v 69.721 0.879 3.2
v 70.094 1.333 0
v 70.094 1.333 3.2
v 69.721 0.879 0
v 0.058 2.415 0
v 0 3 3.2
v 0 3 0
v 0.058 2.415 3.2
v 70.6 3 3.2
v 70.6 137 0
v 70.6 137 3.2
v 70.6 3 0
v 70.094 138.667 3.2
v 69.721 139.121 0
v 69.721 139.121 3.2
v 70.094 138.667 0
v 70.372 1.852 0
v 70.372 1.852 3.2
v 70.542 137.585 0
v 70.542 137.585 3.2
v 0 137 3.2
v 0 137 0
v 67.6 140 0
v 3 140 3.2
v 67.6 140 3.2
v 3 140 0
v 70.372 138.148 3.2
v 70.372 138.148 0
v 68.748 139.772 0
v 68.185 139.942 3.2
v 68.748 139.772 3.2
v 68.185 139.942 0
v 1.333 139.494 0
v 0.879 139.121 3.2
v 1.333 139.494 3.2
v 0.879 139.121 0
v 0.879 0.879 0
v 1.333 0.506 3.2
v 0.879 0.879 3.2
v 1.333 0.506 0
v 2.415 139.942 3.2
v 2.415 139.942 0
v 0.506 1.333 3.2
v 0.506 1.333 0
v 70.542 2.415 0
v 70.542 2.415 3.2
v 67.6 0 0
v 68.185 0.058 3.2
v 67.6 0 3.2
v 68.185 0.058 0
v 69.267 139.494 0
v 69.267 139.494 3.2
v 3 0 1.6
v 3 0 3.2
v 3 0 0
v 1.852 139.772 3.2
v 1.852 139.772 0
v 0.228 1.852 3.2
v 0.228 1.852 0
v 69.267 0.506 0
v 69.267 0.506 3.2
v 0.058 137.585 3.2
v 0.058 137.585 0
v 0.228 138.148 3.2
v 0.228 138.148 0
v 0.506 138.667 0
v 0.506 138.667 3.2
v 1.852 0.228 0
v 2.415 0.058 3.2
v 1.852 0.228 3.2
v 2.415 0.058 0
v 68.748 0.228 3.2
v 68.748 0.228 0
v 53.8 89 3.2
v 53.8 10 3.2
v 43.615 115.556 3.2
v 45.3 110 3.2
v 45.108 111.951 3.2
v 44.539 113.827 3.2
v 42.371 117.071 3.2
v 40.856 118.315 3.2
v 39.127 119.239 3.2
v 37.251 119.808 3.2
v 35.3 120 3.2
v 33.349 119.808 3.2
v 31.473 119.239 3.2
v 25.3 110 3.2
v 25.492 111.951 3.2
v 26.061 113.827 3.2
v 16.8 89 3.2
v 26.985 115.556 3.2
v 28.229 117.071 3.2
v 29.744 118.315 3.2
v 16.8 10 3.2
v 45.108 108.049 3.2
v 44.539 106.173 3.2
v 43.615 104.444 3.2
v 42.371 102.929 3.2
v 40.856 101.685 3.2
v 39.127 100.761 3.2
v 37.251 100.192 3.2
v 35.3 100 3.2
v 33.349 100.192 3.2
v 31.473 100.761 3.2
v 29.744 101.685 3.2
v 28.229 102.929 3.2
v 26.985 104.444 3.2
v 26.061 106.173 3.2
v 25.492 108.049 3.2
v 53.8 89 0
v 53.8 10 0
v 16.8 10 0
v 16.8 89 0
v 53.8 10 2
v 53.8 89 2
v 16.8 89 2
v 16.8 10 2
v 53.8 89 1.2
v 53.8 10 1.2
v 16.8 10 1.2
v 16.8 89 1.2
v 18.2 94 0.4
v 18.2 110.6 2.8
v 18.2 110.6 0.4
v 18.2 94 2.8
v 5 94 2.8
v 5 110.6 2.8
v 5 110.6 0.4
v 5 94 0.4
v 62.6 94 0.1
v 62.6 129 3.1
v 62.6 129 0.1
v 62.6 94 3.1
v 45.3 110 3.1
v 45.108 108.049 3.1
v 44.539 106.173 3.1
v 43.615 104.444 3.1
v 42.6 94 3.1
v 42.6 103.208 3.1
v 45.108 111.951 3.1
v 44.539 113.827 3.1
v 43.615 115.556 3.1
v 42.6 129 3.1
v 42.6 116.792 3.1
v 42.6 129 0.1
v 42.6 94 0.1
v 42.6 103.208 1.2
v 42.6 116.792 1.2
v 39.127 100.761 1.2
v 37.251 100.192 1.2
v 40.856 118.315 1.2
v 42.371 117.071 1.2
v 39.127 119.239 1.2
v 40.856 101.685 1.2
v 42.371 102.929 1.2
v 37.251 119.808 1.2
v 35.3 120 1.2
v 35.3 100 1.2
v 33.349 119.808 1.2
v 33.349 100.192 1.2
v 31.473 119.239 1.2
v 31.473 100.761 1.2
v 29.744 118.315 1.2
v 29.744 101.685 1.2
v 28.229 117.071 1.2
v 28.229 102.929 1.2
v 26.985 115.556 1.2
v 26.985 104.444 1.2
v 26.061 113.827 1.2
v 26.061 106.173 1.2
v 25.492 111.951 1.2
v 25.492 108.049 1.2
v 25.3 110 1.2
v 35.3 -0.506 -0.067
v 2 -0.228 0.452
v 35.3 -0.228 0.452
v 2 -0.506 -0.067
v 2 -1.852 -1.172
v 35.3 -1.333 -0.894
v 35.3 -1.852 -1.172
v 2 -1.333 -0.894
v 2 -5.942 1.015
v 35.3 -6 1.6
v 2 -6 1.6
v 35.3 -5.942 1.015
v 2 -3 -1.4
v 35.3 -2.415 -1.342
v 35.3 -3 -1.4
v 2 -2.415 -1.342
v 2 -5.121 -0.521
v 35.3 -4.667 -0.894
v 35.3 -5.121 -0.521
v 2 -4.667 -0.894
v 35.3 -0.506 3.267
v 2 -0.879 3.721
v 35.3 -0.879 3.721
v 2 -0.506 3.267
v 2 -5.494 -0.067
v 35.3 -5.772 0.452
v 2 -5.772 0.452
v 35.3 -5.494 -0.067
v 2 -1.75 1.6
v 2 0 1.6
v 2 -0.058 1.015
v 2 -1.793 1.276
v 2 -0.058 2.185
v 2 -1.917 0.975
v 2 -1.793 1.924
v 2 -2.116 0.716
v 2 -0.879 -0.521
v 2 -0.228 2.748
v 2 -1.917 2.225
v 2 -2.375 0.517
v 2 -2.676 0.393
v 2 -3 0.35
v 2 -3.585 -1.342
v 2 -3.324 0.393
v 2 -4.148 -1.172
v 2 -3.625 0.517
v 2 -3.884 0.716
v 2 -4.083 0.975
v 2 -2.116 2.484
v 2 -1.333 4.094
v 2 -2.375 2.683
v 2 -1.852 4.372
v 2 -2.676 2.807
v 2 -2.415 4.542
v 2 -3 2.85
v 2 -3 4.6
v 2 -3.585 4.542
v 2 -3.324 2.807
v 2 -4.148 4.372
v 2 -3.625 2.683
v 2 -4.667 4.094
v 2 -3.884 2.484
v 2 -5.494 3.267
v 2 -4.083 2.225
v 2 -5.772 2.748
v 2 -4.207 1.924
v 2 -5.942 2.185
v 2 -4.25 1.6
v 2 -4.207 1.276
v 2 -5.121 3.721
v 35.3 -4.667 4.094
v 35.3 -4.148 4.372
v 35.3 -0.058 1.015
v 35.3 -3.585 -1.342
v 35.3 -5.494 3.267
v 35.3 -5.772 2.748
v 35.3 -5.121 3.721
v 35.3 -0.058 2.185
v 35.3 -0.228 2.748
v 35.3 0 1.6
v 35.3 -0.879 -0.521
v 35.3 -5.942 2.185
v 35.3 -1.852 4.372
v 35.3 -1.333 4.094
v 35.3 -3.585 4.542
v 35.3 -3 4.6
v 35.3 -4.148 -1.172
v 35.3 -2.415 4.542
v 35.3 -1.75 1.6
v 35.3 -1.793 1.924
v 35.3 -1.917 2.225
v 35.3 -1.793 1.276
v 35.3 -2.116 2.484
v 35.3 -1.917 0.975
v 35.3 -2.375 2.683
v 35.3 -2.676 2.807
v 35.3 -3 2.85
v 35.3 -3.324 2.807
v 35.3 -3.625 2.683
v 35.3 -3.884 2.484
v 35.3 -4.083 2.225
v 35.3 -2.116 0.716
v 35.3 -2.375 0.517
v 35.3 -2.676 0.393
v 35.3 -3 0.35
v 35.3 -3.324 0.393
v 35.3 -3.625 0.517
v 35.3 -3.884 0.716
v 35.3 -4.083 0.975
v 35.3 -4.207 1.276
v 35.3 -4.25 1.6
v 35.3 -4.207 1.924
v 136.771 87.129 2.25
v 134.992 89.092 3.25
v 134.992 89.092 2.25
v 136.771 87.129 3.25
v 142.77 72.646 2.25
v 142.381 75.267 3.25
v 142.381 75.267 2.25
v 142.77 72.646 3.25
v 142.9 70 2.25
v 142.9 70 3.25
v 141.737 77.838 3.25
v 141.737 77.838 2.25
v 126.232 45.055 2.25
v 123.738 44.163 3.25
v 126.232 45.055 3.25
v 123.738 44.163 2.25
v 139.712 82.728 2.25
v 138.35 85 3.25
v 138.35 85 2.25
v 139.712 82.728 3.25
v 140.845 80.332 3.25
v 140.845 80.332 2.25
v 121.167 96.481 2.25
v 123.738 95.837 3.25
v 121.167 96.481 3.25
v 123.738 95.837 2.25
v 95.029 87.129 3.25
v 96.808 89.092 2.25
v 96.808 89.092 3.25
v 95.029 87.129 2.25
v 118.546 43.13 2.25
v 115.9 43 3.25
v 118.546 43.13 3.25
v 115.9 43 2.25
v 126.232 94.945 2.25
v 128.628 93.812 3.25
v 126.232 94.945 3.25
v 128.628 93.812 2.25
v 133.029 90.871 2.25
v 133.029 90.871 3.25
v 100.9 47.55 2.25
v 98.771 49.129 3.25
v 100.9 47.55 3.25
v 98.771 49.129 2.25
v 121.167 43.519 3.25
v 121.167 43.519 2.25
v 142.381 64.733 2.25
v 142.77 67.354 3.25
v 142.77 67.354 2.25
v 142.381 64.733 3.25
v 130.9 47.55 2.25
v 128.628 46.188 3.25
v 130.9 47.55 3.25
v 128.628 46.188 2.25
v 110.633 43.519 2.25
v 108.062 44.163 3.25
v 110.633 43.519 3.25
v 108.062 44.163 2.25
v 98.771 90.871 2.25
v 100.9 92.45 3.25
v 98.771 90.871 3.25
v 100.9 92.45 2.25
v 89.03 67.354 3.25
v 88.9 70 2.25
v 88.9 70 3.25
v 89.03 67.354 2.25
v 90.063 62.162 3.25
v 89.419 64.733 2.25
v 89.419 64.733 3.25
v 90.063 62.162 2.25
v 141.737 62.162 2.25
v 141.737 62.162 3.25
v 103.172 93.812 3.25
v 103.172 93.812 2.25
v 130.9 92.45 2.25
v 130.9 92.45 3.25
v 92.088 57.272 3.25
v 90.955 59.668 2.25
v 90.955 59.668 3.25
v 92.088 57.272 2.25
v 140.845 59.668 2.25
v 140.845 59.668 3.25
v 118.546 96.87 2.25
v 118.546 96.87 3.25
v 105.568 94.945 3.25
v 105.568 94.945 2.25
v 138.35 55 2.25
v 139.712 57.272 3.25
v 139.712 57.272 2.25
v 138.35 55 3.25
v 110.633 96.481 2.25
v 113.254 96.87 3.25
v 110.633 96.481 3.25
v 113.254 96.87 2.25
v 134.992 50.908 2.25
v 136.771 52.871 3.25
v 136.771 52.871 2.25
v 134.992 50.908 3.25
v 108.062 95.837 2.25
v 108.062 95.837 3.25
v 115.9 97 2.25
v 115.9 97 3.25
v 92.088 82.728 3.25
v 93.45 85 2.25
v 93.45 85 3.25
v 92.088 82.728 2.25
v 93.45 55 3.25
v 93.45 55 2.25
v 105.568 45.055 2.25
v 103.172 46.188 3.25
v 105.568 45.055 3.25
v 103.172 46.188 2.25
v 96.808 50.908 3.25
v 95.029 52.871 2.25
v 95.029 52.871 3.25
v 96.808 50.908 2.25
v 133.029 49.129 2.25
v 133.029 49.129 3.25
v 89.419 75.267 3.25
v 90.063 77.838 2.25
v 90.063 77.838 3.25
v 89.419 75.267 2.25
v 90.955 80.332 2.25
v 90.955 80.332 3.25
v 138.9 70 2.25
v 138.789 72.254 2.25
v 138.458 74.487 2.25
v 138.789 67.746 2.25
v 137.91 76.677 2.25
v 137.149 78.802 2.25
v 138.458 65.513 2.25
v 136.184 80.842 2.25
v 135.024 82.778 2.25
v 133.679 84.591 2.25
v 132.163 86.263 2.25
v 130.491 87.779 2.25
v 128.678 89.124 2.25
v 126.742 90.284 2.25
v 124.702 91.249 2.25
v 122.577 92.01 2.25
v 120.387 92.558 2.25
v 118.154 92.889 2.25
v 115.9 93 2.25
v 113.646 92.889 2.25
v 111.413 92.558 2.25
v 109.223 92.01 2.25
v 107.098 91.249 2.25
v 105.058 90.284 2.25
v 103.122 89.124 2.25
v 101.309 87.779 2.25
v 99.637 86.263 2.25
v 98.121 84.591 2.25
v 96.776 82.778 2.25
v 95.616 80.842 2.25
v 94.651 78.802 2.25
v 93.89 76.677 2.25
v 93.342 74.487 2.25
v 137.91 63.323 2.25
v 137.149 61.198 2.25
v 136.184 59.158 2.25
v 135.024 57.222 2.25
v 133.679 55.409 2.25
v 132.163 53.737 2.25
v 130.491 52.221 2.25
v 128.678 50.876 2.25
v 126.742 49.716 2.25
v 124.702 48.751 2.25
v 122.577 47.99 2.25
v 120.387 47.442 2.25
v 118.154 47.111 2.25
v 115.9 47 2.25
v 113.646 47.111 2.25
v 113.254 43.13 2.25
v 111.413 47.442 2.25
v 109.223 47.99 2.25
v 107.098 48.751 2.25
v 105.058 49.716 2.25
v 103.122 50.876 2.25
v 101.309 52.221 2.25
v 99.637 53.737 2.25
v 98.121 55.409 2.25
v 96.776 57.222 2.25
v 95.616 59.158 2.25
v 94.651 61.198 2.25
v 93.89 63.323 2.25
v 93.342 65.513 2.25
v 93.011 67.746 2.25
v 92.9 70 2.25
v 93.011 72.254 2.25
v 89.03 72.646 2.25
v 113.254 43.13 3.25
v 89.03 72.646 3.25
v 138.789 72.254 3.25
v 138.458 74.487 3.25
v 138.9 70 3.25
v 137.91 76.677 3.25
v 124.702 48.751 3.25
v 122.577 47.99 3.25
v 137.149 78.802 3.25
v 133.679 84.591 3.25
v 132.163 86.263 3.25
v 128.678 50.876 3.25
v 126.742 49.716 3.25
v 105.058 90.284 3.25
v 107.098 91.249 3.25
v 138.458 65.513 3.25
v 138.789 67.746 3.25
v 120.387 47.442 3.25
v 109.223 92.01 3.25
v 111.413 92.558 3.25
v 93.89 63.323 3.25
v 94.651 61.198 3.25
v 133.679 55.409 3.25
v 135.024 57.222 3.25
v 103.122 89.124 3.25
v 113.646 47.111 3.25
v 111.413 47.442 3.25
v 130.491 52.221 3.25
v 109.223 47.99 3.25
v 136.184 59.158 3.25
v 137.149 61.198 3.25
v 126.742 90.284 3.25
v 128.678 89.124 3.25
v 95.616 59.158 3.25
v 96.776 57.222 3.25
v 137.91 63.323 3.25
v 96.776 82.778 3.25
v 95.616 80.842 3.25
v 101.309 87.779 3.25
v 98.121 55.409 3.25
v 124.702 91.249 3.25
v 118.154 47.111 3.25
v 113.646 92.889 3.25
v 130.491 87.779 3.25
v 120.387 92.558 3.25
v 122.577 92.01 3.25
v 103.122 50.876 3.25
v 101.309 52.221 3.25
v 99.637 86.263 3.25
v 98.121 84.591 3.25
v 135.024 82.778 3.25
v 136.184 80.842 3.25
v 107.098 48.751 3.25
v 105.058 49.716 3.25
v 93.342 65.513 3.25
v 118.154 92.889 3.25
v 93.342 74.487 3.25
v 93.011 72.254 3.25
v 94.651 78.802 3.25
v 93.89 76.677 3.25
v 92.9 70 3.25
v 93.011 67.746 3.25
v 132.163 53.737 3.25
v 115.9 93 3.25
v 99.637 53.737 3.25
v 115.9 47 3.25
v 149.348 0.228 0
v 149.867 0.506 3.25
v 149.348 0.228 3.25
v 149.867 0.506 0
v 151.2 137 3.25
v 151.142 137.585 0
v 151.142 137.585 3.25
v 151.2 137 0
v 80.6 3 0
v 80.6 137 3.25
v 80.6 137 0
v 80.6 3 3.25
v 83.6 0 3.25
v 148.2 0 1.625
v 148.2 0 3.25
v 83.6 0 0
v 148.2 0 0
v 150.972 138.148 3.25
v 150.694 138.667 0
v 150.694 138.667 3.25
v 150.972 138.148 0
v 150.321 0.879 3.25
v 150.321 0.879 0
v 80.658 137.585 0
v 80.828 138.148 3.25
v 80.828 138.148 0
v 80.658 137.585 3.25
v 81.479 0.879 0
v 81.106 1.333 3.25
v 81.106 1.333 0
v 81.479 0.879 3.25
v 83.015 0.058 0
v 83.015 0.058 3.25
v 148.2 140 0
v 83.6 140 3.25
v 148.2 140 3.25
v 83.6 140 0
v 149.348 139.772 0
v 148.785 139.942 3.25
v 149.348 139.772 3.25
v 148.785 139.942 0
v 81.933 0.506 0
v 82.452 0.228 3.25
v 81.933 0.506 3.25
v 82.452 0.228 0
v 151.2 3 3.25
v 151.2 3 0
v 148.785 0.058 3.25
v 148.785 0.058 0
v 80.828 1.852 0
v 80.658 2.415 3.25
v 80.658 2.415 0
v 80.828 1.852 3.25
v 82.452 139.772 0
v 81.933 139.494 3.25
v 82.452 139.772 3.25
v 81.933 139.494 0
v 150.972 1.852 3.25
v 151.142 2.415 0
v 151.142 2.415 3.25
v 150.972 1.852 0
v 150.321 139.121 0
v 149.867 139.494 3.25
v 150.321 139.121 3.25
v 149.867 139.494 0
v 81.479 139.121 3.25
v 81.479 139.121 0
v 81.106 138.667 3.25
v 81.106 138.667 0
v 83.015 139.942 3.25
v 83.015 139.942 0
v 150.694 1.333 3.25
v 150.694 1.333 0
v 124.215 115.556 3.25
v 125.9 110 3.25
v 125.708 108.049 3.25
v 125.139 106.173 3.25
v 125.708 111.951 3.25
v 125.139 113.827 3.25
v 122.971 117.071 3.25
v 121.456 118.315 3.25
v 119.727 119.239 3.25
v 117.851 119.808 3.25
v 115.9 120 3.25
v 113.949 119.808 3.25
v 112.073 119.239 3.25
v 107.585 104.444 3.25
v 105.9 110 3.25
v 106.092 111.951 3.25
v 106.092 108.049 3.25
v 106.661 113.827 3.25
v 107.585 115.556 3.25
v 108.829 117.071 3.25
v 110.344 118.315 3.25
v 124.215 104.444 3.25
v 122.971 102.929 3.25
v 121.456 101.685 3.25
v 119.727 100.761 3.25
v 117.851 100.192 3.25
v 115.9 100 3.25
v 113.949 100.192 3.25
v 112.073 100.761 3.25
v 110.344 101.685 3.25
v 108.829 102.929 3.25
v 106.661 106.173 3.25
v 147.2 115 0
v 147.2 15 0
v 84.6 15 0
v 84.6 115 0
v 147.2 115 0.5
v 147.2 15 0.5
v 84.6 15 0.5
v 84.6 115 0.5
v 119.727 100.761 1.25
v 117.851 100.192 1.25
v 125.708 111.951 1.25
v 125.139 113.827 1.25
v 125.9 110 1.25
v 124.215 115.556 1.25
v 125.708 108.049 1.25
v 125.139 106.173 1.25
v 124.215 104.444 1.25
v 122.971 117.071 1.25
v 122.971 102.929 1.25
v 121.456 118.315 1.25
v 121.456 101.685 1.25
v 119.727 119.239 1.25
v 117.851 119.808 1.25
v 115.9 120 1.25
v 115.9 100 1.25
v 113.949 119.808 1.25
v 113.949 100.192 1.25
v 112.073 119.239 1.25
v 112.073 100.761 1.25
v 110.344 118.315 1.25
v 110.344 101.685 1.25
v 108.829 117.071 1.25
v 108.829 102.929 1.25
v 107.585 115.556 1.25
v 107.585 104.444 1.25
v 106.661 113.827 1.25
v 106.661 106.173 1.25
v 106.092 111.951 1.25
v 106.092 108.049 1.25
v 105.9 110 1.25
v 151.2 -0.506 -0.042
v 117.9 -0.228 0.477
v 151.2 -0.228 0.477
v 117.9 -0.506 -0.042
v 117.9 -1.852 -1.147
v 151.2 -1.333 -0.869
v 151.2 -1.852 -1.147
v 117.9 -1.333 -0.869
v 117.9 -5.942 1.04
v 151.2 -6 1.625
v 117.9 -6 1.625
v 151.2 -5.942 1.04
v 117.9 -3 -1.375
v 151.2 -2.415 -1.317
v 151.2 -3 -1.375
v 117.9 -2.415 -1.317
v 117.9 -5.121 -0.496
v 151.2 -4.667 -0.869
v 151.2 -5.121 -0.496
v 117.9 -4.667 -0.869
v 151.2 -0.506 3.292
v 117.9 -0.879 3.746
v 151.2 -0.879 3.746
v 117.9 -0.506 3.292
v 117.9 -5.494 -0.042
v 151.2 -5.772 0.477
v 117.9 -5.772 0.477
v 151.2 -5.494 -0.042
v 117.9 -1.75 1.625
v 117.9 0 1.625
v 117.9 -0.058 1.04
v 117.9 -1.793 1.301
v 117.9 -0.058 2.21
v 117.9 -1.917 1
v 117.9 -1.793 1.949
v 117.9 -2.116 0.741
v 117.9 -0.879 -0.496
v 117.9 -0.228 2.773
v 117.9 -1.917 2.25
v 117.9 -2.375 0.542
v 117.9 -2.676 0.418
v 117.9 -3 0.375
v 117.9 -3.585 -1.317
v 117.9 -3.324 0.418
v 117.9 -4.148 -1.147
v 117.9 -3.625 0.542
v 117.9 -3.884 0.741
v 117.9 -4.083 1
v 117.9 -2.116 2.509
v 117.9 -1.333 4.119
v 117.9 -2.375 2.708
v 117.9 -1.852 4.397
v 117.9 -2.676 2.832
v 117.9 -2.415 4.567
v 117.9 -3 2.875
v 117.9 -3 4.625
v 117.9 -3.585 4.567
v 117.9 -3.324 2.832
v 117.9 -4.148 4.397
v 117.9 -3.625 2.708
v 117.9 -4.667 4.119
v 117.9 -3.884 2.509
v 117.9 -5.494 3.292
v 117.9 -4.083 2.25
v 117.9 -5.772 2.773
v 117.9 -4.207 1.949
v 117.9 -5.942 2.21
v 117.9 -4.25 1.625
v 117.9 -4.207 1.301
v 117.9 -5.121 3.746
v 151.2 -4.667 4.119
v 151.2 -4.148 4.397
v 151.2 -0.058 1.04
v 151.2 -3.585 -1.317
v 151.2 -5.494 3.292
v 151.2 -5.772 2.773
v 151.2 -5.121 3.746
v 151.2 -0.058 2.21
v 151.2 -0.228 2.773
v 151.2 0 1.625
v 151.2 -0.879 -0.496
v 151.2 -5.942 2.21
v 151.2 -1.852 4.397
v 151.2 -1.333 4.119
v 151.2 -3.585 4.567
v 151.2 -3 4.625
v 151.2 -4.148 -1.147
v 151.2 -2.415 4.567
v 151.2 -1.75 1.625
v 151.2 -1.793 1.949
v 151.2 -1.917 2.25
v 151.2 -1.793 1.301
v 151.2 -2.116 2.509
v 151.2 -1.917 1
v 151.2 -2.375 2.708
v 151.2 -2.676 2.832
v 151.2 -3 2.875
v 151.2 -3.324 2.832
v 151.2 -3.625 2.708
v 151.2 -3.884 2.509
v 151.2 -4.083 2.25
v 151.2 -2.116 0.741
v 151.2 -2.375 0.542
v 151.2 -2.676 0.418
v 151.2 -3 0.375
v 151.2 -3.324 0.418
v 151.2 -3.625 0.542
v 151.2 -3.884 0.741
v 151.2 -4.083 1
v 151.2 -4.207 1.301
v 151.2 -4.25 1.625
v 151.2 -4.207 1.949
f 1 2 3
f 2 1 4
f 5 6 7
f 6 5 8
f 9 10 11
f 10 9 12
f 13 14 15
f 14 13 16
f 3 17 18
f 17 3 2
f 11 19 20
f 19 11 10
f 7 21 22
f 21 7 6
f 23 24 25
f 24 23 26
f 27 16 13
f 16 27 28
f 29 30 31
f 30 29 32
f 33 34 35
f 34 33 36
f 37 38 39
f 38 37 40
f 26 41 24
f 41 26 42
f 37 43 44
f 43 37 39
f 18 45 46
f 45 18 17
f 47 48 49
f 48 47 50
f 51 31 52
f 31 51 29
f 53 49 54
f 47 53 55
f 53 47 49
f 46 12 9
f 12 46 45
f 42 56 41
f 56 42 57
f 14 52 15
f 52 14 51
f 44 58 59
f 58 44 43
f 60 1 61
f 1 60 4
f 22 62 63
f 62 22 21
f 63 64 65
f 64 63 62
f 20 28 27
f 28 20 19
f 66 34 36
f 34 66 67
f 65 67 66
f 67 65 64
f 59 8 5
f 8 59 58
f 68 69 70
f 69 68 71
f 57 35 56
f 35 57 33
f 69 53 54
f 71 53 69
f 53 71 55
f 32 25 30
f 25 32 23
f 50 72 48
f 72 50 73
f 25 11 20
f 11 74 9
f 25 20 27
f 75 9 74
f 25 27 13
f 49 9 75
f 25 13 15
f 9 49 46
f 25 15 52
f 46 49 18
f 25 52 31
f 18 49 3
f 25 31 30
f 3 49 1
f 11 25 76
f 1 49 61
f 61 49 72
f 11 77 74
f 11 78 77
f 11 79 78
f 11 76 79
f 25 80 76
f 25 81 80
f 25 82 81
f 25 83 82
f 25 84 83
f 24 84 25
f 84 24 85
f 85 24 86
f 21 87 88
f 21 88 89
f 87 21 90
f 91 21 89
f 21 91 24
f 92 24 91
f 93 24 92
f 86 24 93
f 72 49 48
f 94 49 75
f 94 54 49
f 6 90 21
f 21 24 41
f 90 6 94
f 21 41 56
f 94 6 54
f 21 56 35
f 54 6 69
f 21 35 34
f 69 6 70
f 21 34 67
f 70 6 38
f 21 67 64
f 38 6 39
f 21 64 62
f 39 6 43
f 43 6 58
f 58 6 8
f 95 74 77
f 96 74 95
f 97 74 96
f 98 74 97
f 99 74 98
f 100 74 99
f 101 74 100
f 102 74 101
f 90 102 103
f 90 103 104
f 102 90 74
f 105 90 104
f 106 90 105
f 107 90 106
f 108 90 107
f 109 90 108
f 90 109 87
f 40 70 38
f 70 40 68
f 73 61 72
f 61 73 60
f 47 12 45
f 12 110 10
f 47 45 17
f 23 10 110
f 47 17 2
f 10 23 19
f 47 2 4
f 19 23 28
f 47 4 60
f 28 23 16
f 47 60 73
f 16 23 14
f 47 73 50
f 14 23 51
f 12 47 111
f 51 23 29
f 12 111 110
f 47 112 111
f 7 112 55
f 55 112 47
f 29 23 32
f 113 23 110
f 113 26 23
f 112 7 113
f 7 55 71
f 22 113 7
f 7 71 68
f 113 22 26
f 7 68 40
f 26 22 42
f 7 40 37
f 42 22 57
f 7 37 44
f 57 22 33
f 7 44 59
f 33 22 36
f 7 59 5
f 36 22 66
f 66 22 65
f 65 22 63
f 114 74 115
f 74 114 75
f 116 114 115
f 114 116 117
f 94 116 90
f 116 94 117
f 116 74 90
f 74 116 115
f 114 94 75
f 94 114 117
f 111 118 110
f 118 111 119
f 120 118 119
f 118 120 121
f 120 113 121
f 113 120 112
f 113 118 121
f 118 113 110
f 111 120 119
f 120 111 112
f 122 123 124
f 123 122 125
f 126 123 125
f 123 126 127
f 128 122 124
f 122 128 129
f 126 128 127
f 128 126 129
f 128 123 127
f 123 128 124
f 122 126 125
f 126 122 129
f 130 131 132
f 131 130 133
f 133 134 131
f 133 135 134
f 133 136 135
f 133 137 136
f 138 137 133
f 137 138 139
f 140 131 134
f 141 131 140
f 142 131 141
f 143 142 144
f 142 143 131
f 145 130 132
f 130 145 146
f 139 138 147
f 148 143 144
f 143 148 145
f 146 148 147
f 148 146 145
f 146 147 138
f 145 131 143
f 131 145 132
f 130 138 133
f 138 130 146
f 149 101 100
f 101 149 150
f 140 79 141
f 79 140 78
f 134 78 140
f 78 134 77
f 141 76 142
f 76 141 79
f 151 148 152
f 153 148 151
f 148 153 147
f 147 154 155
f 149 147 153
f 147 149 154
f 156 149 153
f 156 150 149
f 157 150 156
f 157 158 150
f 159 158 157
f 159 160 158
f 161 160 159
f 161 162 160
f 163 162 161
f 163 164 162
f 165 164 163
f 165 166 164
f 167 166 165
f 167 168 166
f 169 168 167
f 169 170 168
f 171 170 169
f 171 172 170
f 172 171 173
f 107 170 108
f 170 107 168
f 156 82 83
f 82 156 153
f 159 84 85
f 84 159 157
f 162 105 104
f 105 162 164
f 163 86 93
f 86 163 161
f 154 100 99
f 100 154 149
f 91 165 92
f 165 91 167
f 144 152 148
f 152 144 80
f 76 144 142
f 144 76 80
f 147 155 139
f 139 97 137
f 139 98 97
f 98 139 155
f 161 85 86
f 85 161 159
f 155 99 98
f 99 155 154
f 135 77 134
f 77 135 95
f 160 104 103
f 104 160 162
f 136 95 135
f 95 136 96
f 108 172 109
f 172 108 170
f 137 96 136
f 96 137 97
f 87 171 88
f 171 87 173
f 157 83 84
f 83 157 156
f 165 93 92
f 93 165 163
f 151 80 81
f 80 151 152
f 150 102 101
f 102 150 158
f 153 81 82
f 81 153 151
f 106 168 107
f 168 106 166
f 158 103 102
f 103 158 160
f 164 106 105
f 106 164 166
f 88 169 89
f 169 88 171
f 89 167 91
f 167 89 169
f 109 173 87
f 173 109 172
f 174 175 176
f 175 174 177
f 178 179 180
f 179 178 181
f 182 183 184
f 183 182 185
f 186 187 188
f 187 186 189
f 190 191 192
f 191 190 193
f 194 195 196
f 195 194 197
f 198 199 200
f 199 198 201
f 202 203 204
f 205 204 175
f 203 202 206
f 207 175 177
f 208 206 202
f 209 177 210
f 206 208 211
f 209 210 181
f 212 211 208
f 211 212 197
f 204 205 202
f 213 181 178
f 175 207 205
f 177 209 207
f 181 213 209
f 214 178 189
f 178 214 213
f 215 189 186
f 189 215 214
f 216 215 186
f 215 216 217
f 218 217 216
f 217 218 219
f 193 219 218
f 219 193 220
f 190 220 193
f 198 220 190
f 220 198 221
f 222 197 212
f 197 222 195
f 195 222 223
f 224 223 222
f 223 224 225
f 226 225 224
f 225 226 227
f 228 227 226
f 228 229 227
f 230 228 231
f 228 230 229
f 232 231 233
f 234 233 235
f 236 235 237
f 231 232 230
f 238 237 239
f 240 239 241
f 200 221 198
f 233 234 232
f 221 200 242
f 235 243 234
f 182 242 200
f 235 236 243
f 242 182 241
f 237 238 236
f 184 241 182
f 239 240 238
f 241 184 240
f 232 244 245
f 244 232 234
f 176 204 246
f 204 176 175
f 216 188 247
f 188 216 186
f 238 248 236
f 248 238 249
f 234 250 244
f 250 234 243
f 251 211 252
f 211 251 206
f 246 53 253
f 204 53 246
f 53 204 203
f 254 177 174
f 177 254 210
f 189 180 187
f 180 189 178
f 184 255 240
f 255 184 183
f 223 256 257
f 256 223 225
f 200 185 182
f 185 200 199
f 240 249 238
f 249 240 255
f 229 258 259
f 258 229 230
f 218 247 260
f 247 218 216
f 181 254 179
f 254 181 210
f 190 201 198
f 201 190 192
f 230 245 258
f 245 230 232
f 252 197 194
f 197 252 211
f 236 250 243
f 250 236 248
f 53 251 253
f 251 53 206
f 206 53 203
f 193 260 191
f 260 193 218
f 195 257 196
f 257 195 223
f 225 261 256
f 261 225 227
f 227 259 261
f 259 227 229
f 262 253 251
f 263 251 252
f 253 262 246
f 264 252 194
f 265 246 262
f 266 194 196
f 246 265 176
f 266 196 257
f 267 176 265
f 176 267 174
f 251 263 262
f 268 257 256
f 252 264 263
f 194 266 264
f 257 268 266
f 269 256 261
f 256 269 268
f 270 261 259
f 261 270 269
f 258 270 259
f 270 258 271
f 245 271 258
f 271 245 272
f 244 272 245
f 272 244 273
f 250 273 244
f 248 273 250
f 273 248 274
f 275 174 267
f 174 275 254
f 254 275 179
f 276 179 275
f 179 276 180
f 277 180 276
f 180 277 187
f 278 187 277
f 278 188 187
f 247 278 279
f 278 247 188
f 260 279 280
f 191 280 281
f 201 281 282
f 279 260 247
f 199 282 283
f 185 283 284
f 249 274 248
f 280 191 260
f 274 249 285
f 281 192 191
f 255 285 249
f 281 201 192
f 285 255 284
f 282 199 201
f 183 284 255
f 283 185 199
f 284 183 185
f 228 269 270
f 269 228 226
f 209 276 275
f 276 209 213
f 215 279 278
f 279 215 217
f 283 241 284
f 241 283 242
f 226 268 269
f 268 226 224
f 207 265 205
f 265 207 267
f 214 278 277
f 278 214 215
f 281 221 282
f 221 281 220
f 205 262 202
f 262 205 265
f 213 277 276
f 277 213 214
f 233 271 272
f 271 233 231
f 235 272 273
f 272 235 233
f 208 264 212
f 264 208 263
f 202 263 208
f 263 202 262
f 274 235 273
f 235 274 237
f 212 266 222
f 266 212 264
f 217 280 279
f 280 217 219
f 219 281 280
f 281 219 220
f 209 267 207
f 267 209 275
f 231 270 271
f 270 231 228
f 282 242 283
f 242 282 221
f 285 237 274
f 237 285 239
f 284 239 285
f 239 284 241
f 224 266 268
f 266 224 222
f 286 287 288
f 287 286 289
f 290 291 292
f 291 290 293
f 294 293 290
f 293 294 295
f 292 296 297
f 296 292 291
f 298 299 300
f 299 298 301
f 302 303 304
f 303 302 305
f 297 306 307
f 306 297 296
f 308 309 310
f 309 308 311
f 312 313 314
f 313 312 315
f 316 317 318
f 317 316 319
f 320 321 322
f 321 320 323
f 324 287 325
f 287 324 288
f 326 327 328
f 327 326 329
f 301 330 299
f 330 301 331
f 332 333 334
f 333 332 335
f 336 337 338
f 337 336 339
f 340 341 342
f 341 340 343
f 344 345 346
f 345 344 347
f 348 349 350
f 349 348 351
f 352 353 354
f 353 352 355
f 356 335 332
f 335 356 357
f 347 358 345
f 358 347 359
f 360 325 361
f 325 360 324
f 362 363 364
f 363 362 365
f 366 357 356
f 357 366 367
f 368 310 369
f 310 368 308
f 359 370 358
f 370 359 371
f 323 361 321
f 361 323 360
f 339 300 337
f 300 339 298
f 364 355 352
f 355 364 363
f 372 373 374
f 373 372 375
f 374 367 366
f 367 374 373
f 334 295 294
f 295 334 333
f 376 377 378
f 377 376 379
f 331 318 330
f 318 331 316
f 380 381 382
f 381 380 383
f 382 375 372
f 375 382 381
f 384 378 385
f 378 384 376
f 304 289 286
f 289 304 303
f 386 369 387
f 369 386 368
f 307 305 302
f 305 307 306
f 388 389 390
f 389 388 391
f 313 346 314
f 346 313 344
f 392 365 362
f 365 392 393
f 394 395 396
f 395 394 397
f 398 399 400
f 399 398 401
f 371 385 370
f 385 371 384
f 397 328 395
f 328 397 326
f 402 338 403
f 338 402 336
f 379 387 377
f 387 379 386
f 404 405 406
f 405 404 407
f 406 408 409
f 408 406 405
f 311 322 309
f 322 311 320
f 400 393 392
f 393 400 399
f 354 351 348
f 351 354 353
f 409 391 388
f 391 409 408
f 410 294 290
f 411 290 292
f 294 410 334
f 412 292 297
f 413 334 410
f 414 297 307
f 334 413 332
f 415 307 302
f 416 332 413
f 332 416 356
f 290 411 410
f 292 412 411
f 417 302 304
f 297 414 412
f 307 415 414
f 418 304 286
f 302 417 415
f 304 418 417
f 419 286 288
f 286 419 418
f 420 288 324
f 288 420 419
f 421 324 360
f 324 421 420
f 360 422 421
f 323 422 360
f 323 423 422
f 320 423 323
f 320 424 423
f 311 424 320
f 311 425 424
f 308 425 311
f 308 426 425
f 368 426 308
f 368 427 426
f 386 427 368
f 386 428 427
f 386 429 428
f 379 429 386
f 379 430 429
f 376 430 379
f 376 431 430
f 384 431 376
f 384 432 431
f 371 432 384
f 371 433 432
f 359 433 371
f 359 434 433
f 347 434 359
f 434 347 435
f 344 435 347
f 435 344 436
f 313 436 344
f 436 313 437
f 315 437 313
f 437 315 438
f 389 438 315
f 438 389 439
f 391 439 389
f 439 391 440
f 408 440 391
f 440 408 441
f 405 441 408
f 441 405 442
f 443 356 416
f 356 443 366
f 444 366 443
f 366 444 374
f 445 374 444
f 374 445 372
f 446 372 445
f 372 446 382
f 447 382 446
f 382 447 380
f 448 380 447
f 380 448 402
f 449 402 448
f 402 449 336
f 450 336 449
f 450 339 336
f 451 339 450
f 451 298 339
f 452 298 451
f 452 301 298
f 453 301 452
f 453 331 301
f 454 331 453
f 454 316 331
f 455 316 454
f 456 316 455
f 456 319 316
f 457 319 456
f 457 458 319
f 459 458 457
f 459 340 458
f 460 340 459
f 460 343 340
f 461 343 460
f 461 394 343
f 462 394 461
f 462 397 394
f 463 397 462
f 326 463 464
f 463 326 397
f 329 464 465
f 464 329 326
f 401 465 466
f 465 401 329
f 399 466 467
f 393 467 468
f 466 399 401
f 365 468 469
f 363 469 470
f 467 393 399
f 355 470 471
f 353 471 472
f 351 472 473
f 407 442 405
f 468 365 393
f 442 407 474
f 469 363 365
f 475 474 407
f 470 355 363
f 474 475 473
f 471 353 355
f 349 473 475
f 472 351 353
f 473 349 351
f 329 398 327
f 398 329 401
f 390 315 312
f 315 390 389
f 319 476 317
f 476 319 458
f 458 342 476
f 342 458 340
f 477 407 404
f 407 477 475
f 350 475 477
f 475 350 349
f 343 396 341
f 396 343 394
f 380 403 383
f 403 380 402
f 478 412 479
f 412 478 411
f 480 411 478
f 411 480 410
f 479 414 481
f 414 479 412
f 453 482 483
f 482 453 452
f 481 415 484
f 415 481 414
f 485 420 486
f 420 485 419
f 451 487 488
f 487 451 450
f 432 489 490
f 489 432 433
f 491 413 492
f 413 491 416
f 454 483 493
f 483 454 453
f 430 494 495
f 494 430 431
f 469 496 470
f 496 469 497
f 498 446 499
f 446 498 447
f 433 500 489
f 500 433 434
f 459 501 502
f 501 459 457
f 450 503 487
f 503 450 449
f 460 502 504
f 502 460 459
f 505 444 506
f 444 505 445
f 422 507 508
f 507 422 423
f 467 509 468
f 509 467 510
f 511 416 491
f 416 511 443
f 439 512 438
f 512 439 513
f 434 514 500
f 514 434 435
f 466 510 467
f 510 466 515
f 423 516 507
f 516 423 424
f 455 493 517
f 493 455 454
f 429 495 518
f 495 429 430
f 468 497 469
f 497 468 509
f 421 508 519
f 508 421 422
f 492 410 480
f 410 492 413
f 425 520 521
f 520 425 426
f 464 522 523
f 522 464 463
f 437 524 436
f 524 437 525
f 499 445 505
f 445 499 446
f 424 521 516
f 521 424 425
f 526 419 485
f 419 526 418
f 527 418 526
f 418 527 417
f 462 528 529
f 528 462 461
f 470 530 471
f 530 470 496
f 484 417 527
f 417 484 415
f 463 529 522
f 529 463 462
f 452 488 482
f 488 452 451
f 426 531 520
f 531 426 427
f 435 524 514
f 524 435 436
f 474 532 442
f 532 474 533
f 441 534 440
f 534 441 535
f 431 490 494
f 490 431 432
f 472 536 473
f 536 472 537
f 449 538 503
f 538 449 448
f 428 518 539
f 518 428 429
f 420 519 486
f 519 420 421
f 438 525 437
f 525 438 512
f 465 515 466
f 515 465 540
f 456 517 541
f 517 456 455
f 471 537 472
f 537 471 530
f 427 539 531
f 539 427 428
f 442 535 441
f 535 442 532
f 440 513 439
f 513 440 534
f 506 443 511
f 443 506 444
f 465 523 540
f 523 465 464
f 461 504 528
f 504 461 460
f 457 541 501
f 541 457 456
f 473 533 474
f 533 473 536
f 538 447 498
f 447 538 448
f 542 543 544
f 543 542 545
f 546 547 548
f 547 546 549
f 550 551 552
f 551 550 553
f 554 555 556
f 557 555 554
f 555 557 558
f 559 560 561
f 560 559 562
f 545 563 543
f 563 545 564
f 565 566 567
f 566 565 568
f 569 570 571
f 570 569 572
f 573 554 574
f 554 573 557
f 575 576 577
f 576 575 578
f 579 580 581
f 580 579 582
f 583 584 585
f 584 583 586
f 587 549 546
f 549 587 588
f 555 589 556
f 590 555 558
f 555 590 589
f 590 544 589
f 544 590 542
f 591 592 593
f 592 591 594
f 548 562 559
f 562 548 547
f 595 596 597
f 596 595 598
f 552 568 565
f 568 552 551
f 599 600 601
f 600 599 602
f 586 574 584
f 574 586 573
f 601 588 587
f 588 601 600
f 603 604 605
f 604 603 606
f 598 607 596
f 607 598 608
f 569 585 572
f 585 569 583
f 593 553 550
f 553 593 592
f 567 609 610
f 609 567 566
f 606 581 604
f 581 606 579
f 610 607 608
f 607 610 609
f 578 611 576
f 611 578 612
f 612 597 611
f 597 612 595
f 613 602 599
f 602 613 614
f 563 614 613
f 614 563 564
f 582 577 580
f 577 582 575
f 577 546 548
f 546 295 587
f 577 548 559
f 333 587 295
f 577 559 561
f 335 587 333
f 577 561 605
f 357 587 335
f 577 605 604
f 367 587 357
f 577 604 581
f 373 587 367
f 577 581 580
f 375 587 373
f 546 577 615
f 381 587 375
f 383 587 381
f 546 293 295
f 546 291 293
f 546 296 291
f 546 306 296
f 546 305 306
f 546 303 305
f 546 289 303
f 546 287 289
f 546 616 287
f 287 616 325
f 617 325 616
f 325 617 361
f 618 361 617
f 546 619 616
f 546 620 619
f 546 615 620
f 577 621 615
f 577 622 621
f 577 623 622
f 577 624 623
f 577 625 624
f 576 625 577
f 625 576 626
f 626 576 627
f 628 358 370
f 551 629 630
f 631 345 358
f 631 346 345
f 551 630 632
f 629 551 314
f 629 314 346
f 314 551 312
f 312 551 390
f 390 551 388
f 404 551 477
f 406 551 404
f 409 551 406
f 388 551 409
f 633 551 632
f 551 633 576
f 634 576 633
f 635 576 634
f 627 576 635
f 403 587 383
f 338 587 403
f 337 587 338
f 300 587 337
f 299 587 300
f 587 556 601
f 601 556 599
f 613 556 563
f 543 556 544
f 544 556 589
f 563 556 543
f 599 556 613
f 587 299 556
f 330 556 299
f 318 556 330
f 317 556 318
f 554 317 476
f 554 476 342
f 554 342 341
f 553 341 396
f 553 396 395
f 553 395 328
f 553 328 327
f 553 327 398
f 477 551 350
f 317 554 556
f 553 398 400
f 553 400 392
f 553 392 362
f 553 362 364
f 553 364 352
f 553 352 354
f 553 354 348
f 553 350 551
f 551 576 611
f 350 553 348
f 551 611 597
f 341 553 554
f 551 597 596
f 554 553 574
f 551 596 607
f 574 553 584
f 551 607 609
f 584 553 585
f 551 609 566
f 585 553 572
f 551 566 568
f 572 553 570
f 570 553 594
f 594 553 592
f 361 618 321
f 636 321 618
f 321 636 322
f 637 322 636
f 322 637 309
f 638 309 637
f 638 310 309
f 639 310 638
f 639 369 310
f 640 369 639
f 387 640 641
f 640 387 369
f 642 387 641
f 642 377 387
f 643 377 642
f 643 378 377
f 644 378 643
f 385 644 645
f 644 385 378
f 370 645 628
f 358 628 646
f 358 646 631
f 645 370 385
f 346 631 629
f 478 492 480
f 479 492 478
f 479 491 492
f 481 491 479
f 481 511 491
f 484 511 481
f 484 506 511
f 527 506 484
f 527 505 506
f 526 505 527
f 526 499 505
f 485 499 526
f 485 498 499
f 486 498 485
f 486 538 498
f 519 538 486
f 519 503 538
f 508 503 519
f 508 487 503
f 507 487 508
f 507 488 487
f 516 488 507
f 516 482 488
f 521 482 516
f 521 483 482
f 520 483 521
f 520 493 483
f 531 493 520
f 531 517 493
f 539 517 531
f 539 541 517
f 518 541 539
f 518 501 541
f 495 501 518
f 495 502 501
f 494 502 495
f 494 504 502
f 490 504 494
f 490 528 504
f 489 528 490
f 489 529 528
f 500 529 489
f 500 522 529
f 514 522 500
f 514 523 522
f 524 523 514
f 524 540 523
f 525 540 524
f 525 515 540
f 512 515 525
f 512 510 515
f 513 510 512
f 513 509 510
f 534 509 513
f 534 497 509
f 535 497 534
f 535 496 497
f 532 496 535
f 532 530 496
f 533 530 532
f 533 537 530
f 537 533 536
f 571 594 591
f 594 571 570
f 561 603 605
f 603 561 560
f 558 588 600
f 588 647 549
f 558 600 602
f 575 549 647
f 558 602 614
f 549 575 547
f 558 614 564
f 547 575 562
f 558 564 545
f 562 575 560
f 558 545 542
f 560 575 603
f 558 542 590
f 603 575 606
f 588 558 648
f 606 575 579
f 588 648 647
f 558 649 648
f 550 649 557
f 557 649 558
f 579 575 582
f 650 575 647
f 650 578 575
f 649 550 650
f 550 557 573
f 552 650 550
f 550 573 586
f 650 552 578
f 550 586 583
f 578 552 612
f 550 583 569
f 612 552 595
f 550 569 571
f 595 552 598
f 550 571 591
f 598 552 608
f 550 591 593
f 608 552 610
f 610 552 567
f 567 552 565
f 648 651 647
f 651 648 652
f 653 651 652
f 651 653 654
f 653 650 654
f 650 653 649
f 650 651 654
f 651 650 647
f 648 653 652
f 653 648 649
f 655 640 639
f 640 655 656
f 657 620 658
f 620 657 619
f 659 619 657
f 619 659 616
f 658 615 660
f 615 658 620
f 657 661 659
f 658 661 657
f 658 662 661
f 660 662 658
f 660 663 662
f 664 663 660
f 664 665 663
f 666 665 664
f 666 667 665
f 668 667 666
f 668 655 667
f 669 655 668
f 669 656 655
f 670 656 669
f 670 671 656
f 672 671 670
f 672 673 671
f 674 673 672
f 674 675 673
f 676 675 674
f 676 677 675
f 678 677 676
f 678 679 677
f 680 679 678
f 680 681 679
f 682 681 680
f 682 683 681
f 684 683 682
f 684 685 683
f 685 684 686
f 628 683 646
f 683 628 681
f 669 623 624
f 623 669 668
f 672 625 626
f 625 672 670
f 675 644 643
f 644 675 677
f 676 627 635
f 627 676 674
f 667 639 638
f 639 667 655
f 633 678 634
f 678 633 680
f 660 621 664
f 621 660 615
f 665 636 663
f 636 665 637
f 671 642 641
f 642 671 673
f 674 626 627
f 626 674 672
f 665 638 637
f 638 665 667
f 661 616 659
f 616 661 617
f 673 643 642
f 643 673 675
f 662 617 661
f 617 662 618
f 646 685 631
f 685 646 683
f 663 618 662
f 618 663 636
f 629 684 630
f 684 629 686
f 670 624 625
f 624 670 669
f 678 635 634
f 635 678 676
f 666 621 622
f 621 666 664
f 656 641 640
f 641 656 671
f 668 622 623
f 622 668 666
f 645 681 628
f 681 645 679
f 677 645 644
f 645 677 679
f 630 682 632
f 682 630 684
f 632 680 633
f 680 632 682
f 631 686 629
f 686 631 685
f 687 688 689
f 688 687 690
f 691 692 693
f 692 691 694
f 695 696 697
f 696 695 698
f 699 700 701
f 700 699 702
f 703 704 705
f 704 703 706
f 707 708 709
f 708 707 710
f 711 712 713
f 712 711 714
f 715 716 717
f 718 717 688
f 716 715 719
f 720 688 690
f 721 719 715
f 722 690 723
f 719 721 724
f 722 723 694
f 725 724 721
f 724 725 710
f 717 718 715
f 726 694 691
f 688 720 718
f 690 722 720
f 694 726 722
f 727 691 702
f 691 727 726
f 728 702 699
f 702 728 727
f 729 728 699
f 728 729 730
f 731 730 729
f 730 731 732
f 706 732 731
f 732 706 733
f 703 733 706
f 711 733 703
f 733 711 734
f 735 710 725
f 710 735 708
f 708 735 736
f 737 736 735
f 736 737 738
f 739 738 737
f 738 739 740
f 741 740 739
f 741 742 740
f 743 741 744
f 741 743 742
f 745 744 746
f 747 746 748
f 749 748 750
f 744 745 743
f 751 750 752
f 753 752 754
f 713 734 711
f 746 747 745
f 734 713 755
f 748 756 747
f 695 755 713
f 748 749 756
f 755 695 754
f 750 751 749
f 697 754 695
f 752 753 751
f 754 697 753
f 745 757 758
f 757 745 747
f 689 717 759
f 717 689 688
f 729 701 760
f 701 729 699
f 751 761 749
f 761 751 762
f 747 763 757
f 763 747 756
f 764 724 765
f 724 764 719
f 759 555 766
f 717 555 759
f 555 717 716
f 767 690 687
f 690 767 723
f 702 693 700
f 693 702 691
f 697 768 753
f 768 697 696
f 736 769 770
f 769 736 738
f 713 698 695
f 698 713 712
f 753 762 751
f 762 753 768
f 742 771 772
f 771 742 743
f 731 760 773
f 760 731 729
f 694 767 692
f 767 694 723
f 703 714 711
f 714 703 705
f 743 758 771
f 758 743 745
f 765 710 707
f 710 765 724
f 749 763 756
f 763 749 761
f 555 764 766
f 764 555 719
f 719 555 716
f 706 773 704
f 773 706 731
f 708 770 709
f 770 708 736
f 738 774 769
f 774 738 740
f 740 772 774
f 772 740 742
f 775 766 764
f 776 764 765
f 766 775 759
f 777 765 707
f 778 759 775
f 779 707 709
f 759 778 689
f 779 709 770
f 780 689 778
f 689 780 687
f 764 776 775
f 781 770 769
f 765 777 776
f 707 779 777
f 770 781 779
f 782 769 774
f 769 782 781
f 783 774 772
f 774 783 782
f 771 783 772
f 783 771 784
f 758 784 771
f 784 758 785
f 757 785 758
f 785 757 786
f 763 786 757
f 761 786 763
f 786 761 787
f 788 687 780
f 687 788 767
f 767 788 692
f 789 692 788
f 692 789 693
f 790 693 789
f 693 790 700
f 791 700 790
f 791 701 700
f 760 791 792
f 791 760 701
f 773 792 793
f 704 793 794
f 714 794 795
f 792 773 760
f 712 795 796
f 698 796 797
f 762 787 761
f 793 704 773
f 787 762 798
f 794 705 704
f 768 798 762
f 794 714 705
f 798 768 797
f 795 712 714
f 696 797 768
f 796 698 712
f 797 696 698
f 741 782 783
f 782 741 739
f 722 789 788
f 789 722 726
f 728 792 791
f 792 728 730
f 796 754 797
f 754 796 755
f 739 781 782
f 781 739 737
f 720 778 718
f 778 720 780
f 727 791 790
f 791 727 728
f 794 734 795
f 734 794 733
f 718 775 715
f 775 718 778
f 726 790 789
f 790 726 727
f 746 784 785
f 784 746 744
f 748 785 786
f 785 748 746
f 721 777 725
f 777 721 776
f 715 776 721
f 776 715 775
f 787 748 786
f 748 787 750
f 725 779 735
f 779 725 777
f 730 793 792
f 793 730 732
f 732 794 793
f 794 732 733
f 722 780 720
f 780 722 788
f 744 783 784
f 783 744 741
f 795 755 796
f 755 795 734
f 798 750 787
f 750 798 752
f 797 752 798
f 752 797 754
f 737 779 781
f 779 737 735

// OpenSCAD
// InfoBento Dual-Display Clamshell Mockup
// For 3D printing (FDM, PLA/PETG) via PCBWay
// Units: millimeters
//
// Two halves connected by a hinge channel along the short edge.
// Print each half separately, connect with a Reell TI-C5M hinge
// or a simple pin hinge for the mockup.

// === Device dimensions ===
device_width = 70.6;      // Short edge (matches iPhone 15 Pro width)
device_height = 140;       // Long edge (slightly shorter than iPhone)
corner_radius = 3;         // Rounded corners

// === Display half ===
display_half_thickness = 3.2;  // 1.2mm D panel + 0.8mm PCB + 1.2mm P panel

// eInk panel recesses (both sides)
panel_width = 37;          // 2.9" panel short dimension (portrait)
panel_height = 79;         // 2.9" panel long dimension
panel_depth = 1.2;         // Glass panel thickness
panel_x_offset = (device_width - panel_width) / 2;  // Centered horizontally
panel_y_offset = 10;       // Offset from hinge edge

// ESP32-C3-MINI-1 recess (between panels, below eInk area)
esp_width = 13.2;
esp_height = 16.6;
esp_depth = 2.4;
esp_x_offset = 5;          // Near board edge for antenna clearance
esp_y_offset = panel_y_offset + panel_height + 5;

// Battery recess (between panels, below eInk area)
battery_width = 20;
battery_height = 35;
battery_depth = 3.0;       // Slightly less than gap to leave shell
battery_x_offset = device_width - battery_width - 8;
battery_y_offset = panel_y_offset + panel_height + 5;

// === Solar half ===
solar_half_thickness = 3.25;

// Solar panel recess (inner face, S-side)
solar_width = device_width - 8;   // Nearly full width
solar_height = 100;
solar_depth = 0.5;                 // Shallow recess for thin film
solar_x_offset = 4;
solar_y_offset = 15;

// MagSafe ring recess (outer face, M-side)
magsafe_od = 54;
magsafe_id = 46;
magsafe_depth = 1.0;       // Recess for magnet ring
magsafe_center_x = device_width / 2;
magsafe_center_y = device_height / 2;

// === Hinge ===
hinge_diameter = 6;         // Barrel diameter for pin hinge
hinge_length = device_width - 4;  // Slightly shorter than device width
hinge_pin_diameter = 2.5;  // Pin that connects the two halves

// === Weight insert holes (simulate battery/PCB mass) ===
// Use coins or steel washers — 20mm diameter, 2mm deep
weight_hole_diameter = 20;
weight_hole_depth = 2;

// === Modules ===

module rounded_rect(w, h, t, r) {
    // Rounded rectangle as a hull of 4 cylinders
    hull() {
        translate([r, r, 0]) cylinder(h=t, r=r, $fn=32);
        translate([w-r, r, 0]) cylinder(h=t, r=r, $fn=32);
        translate([r, h-r, 0]) cylinder(h=t, r=r, $fn=32);
        translate([w-r, h-r, 0]) cylinder(h=t, r=r, $fn=32);
    }
}

module hinge_barrel(is_left=true) {
    // Half-barrel with pin hole
    difference() {
        // Barrel
        translate([0, 0, 0])
            rotate([0, 90, 0])
                cylinder(h=hinge_length/2, d=hinge_diameter, $fn=32);
        // Pin hole
        translate([-1, 0, 0])
            rotate([0, 90, 0])
                cylinder(h=hinge_length/2 + 2, d=hinge_pin_diameter, $fn=24);
    }
}

// === Display Half ===
module display_half() {
    difference() {
        // Main body
        rounded_rect(device_width, device_height, display_half_thickness, corner_radius);

        // D-side panel recess (top face, outer display)
        translate([panel_x_offset, panel_y_offset, display_half_thickness - panel_depth])
            cube([panel_width, panel_height, panel_depth + 0.1]);

        // P-side panel recess (bottom face, inner display)
        translate([panel_x_offset, panel_y_offset, -0.1])
            cube([panel_width, panel_height, panel_depth + 0.1]);

        // ESP32 recess (carved from one side, between panels)
        translate([esp_x_offset, esp_y_offset, display_half_thickness/2 - esp_depth/2])
            cube([esp_width, esp_height, esp_depth]);

        // Battery recess (carved from one side)
        translate([battery_x_offset, battery_y_offset, display_half_thickness/2 - battery_depth/2])
            cube([battery_width, battery_height, battery_depth]);

        // Weight insert hole (D-side, for mockup mass simulation)
        translate([device_width/2, device_height - 30, display_half_thickness - weight_hole_depth])
            cylinder(d=weight_hole_diameter, h=weight_hole_depth + 0.1, $fn=32);
    }

    // Hinge barrel (at y=0 edge, left side)
    translate([2, -hinge_diameter/2, display_half_thickness/2])
        hinge_barrel(true);
}

// === Solar Half ===
module solar_half() {
    difference() {
        // Main body
        rounded_rect(device_width, device_height, solar_half_thickness, corner_radius);

        // Solar panel recess (inner face, S-side, bottom)
        translate([solar_x_offset, solar_y_offset, -0.1])
            cube([solar_width, solar_height, solar_depth + 0.1]);

        // MagSafe ring recess (outer face, M-side, top)
        translate([magsafe_center_x, magsafe_center_y, solar_half_thickness - magsafe_depth]) {
            difference() {
                cylinder(d=magsafe_od, h=magsafe_depth + 0.1, $fn=64);
                translate([0, 0, -0.1])
                    cylinder(d=magsafe_id, h=magsafe_depth + 0.3, $fn=64);
            }
        }

        // Weight insert hole (M-side)
        translate([device_width/2, device_height - 30, solar_half_thickness - weight_hole_depth])
            cylinder(d=weight_hole_diameter, h=weight_hole_depth + 0.1, $fn=32);
    }

    // Hinge barrel (at y=0 edge, right side)
    translate([device_width/2 + 2, -hinge_diameter/2, solar_half_thickness/2])
        hinge_barrel(false);
}

// === Assembly view ===
// Lay both halves side by side for printing, or use the closed view

// Print layout: both halves flat, separated
module print_layout() {
    display_half();
    translate([device_width + 10, 0, 0])
        solar_half();
}

// Closed view: stacked (for visualization)
module closed_view() {
    display_half();
    translate([0, 0, display_half_thickness + 0.5])
        mirror([0, 0, 1])
            translate([0, 0, -solar_half_thickness])
                solar_half();
}

// === Render ===
// Uncomment the view you want:

print_layout();      // For 3D printing — two halves side by side
// closed_view();    // For visualization — stacked as if closed
